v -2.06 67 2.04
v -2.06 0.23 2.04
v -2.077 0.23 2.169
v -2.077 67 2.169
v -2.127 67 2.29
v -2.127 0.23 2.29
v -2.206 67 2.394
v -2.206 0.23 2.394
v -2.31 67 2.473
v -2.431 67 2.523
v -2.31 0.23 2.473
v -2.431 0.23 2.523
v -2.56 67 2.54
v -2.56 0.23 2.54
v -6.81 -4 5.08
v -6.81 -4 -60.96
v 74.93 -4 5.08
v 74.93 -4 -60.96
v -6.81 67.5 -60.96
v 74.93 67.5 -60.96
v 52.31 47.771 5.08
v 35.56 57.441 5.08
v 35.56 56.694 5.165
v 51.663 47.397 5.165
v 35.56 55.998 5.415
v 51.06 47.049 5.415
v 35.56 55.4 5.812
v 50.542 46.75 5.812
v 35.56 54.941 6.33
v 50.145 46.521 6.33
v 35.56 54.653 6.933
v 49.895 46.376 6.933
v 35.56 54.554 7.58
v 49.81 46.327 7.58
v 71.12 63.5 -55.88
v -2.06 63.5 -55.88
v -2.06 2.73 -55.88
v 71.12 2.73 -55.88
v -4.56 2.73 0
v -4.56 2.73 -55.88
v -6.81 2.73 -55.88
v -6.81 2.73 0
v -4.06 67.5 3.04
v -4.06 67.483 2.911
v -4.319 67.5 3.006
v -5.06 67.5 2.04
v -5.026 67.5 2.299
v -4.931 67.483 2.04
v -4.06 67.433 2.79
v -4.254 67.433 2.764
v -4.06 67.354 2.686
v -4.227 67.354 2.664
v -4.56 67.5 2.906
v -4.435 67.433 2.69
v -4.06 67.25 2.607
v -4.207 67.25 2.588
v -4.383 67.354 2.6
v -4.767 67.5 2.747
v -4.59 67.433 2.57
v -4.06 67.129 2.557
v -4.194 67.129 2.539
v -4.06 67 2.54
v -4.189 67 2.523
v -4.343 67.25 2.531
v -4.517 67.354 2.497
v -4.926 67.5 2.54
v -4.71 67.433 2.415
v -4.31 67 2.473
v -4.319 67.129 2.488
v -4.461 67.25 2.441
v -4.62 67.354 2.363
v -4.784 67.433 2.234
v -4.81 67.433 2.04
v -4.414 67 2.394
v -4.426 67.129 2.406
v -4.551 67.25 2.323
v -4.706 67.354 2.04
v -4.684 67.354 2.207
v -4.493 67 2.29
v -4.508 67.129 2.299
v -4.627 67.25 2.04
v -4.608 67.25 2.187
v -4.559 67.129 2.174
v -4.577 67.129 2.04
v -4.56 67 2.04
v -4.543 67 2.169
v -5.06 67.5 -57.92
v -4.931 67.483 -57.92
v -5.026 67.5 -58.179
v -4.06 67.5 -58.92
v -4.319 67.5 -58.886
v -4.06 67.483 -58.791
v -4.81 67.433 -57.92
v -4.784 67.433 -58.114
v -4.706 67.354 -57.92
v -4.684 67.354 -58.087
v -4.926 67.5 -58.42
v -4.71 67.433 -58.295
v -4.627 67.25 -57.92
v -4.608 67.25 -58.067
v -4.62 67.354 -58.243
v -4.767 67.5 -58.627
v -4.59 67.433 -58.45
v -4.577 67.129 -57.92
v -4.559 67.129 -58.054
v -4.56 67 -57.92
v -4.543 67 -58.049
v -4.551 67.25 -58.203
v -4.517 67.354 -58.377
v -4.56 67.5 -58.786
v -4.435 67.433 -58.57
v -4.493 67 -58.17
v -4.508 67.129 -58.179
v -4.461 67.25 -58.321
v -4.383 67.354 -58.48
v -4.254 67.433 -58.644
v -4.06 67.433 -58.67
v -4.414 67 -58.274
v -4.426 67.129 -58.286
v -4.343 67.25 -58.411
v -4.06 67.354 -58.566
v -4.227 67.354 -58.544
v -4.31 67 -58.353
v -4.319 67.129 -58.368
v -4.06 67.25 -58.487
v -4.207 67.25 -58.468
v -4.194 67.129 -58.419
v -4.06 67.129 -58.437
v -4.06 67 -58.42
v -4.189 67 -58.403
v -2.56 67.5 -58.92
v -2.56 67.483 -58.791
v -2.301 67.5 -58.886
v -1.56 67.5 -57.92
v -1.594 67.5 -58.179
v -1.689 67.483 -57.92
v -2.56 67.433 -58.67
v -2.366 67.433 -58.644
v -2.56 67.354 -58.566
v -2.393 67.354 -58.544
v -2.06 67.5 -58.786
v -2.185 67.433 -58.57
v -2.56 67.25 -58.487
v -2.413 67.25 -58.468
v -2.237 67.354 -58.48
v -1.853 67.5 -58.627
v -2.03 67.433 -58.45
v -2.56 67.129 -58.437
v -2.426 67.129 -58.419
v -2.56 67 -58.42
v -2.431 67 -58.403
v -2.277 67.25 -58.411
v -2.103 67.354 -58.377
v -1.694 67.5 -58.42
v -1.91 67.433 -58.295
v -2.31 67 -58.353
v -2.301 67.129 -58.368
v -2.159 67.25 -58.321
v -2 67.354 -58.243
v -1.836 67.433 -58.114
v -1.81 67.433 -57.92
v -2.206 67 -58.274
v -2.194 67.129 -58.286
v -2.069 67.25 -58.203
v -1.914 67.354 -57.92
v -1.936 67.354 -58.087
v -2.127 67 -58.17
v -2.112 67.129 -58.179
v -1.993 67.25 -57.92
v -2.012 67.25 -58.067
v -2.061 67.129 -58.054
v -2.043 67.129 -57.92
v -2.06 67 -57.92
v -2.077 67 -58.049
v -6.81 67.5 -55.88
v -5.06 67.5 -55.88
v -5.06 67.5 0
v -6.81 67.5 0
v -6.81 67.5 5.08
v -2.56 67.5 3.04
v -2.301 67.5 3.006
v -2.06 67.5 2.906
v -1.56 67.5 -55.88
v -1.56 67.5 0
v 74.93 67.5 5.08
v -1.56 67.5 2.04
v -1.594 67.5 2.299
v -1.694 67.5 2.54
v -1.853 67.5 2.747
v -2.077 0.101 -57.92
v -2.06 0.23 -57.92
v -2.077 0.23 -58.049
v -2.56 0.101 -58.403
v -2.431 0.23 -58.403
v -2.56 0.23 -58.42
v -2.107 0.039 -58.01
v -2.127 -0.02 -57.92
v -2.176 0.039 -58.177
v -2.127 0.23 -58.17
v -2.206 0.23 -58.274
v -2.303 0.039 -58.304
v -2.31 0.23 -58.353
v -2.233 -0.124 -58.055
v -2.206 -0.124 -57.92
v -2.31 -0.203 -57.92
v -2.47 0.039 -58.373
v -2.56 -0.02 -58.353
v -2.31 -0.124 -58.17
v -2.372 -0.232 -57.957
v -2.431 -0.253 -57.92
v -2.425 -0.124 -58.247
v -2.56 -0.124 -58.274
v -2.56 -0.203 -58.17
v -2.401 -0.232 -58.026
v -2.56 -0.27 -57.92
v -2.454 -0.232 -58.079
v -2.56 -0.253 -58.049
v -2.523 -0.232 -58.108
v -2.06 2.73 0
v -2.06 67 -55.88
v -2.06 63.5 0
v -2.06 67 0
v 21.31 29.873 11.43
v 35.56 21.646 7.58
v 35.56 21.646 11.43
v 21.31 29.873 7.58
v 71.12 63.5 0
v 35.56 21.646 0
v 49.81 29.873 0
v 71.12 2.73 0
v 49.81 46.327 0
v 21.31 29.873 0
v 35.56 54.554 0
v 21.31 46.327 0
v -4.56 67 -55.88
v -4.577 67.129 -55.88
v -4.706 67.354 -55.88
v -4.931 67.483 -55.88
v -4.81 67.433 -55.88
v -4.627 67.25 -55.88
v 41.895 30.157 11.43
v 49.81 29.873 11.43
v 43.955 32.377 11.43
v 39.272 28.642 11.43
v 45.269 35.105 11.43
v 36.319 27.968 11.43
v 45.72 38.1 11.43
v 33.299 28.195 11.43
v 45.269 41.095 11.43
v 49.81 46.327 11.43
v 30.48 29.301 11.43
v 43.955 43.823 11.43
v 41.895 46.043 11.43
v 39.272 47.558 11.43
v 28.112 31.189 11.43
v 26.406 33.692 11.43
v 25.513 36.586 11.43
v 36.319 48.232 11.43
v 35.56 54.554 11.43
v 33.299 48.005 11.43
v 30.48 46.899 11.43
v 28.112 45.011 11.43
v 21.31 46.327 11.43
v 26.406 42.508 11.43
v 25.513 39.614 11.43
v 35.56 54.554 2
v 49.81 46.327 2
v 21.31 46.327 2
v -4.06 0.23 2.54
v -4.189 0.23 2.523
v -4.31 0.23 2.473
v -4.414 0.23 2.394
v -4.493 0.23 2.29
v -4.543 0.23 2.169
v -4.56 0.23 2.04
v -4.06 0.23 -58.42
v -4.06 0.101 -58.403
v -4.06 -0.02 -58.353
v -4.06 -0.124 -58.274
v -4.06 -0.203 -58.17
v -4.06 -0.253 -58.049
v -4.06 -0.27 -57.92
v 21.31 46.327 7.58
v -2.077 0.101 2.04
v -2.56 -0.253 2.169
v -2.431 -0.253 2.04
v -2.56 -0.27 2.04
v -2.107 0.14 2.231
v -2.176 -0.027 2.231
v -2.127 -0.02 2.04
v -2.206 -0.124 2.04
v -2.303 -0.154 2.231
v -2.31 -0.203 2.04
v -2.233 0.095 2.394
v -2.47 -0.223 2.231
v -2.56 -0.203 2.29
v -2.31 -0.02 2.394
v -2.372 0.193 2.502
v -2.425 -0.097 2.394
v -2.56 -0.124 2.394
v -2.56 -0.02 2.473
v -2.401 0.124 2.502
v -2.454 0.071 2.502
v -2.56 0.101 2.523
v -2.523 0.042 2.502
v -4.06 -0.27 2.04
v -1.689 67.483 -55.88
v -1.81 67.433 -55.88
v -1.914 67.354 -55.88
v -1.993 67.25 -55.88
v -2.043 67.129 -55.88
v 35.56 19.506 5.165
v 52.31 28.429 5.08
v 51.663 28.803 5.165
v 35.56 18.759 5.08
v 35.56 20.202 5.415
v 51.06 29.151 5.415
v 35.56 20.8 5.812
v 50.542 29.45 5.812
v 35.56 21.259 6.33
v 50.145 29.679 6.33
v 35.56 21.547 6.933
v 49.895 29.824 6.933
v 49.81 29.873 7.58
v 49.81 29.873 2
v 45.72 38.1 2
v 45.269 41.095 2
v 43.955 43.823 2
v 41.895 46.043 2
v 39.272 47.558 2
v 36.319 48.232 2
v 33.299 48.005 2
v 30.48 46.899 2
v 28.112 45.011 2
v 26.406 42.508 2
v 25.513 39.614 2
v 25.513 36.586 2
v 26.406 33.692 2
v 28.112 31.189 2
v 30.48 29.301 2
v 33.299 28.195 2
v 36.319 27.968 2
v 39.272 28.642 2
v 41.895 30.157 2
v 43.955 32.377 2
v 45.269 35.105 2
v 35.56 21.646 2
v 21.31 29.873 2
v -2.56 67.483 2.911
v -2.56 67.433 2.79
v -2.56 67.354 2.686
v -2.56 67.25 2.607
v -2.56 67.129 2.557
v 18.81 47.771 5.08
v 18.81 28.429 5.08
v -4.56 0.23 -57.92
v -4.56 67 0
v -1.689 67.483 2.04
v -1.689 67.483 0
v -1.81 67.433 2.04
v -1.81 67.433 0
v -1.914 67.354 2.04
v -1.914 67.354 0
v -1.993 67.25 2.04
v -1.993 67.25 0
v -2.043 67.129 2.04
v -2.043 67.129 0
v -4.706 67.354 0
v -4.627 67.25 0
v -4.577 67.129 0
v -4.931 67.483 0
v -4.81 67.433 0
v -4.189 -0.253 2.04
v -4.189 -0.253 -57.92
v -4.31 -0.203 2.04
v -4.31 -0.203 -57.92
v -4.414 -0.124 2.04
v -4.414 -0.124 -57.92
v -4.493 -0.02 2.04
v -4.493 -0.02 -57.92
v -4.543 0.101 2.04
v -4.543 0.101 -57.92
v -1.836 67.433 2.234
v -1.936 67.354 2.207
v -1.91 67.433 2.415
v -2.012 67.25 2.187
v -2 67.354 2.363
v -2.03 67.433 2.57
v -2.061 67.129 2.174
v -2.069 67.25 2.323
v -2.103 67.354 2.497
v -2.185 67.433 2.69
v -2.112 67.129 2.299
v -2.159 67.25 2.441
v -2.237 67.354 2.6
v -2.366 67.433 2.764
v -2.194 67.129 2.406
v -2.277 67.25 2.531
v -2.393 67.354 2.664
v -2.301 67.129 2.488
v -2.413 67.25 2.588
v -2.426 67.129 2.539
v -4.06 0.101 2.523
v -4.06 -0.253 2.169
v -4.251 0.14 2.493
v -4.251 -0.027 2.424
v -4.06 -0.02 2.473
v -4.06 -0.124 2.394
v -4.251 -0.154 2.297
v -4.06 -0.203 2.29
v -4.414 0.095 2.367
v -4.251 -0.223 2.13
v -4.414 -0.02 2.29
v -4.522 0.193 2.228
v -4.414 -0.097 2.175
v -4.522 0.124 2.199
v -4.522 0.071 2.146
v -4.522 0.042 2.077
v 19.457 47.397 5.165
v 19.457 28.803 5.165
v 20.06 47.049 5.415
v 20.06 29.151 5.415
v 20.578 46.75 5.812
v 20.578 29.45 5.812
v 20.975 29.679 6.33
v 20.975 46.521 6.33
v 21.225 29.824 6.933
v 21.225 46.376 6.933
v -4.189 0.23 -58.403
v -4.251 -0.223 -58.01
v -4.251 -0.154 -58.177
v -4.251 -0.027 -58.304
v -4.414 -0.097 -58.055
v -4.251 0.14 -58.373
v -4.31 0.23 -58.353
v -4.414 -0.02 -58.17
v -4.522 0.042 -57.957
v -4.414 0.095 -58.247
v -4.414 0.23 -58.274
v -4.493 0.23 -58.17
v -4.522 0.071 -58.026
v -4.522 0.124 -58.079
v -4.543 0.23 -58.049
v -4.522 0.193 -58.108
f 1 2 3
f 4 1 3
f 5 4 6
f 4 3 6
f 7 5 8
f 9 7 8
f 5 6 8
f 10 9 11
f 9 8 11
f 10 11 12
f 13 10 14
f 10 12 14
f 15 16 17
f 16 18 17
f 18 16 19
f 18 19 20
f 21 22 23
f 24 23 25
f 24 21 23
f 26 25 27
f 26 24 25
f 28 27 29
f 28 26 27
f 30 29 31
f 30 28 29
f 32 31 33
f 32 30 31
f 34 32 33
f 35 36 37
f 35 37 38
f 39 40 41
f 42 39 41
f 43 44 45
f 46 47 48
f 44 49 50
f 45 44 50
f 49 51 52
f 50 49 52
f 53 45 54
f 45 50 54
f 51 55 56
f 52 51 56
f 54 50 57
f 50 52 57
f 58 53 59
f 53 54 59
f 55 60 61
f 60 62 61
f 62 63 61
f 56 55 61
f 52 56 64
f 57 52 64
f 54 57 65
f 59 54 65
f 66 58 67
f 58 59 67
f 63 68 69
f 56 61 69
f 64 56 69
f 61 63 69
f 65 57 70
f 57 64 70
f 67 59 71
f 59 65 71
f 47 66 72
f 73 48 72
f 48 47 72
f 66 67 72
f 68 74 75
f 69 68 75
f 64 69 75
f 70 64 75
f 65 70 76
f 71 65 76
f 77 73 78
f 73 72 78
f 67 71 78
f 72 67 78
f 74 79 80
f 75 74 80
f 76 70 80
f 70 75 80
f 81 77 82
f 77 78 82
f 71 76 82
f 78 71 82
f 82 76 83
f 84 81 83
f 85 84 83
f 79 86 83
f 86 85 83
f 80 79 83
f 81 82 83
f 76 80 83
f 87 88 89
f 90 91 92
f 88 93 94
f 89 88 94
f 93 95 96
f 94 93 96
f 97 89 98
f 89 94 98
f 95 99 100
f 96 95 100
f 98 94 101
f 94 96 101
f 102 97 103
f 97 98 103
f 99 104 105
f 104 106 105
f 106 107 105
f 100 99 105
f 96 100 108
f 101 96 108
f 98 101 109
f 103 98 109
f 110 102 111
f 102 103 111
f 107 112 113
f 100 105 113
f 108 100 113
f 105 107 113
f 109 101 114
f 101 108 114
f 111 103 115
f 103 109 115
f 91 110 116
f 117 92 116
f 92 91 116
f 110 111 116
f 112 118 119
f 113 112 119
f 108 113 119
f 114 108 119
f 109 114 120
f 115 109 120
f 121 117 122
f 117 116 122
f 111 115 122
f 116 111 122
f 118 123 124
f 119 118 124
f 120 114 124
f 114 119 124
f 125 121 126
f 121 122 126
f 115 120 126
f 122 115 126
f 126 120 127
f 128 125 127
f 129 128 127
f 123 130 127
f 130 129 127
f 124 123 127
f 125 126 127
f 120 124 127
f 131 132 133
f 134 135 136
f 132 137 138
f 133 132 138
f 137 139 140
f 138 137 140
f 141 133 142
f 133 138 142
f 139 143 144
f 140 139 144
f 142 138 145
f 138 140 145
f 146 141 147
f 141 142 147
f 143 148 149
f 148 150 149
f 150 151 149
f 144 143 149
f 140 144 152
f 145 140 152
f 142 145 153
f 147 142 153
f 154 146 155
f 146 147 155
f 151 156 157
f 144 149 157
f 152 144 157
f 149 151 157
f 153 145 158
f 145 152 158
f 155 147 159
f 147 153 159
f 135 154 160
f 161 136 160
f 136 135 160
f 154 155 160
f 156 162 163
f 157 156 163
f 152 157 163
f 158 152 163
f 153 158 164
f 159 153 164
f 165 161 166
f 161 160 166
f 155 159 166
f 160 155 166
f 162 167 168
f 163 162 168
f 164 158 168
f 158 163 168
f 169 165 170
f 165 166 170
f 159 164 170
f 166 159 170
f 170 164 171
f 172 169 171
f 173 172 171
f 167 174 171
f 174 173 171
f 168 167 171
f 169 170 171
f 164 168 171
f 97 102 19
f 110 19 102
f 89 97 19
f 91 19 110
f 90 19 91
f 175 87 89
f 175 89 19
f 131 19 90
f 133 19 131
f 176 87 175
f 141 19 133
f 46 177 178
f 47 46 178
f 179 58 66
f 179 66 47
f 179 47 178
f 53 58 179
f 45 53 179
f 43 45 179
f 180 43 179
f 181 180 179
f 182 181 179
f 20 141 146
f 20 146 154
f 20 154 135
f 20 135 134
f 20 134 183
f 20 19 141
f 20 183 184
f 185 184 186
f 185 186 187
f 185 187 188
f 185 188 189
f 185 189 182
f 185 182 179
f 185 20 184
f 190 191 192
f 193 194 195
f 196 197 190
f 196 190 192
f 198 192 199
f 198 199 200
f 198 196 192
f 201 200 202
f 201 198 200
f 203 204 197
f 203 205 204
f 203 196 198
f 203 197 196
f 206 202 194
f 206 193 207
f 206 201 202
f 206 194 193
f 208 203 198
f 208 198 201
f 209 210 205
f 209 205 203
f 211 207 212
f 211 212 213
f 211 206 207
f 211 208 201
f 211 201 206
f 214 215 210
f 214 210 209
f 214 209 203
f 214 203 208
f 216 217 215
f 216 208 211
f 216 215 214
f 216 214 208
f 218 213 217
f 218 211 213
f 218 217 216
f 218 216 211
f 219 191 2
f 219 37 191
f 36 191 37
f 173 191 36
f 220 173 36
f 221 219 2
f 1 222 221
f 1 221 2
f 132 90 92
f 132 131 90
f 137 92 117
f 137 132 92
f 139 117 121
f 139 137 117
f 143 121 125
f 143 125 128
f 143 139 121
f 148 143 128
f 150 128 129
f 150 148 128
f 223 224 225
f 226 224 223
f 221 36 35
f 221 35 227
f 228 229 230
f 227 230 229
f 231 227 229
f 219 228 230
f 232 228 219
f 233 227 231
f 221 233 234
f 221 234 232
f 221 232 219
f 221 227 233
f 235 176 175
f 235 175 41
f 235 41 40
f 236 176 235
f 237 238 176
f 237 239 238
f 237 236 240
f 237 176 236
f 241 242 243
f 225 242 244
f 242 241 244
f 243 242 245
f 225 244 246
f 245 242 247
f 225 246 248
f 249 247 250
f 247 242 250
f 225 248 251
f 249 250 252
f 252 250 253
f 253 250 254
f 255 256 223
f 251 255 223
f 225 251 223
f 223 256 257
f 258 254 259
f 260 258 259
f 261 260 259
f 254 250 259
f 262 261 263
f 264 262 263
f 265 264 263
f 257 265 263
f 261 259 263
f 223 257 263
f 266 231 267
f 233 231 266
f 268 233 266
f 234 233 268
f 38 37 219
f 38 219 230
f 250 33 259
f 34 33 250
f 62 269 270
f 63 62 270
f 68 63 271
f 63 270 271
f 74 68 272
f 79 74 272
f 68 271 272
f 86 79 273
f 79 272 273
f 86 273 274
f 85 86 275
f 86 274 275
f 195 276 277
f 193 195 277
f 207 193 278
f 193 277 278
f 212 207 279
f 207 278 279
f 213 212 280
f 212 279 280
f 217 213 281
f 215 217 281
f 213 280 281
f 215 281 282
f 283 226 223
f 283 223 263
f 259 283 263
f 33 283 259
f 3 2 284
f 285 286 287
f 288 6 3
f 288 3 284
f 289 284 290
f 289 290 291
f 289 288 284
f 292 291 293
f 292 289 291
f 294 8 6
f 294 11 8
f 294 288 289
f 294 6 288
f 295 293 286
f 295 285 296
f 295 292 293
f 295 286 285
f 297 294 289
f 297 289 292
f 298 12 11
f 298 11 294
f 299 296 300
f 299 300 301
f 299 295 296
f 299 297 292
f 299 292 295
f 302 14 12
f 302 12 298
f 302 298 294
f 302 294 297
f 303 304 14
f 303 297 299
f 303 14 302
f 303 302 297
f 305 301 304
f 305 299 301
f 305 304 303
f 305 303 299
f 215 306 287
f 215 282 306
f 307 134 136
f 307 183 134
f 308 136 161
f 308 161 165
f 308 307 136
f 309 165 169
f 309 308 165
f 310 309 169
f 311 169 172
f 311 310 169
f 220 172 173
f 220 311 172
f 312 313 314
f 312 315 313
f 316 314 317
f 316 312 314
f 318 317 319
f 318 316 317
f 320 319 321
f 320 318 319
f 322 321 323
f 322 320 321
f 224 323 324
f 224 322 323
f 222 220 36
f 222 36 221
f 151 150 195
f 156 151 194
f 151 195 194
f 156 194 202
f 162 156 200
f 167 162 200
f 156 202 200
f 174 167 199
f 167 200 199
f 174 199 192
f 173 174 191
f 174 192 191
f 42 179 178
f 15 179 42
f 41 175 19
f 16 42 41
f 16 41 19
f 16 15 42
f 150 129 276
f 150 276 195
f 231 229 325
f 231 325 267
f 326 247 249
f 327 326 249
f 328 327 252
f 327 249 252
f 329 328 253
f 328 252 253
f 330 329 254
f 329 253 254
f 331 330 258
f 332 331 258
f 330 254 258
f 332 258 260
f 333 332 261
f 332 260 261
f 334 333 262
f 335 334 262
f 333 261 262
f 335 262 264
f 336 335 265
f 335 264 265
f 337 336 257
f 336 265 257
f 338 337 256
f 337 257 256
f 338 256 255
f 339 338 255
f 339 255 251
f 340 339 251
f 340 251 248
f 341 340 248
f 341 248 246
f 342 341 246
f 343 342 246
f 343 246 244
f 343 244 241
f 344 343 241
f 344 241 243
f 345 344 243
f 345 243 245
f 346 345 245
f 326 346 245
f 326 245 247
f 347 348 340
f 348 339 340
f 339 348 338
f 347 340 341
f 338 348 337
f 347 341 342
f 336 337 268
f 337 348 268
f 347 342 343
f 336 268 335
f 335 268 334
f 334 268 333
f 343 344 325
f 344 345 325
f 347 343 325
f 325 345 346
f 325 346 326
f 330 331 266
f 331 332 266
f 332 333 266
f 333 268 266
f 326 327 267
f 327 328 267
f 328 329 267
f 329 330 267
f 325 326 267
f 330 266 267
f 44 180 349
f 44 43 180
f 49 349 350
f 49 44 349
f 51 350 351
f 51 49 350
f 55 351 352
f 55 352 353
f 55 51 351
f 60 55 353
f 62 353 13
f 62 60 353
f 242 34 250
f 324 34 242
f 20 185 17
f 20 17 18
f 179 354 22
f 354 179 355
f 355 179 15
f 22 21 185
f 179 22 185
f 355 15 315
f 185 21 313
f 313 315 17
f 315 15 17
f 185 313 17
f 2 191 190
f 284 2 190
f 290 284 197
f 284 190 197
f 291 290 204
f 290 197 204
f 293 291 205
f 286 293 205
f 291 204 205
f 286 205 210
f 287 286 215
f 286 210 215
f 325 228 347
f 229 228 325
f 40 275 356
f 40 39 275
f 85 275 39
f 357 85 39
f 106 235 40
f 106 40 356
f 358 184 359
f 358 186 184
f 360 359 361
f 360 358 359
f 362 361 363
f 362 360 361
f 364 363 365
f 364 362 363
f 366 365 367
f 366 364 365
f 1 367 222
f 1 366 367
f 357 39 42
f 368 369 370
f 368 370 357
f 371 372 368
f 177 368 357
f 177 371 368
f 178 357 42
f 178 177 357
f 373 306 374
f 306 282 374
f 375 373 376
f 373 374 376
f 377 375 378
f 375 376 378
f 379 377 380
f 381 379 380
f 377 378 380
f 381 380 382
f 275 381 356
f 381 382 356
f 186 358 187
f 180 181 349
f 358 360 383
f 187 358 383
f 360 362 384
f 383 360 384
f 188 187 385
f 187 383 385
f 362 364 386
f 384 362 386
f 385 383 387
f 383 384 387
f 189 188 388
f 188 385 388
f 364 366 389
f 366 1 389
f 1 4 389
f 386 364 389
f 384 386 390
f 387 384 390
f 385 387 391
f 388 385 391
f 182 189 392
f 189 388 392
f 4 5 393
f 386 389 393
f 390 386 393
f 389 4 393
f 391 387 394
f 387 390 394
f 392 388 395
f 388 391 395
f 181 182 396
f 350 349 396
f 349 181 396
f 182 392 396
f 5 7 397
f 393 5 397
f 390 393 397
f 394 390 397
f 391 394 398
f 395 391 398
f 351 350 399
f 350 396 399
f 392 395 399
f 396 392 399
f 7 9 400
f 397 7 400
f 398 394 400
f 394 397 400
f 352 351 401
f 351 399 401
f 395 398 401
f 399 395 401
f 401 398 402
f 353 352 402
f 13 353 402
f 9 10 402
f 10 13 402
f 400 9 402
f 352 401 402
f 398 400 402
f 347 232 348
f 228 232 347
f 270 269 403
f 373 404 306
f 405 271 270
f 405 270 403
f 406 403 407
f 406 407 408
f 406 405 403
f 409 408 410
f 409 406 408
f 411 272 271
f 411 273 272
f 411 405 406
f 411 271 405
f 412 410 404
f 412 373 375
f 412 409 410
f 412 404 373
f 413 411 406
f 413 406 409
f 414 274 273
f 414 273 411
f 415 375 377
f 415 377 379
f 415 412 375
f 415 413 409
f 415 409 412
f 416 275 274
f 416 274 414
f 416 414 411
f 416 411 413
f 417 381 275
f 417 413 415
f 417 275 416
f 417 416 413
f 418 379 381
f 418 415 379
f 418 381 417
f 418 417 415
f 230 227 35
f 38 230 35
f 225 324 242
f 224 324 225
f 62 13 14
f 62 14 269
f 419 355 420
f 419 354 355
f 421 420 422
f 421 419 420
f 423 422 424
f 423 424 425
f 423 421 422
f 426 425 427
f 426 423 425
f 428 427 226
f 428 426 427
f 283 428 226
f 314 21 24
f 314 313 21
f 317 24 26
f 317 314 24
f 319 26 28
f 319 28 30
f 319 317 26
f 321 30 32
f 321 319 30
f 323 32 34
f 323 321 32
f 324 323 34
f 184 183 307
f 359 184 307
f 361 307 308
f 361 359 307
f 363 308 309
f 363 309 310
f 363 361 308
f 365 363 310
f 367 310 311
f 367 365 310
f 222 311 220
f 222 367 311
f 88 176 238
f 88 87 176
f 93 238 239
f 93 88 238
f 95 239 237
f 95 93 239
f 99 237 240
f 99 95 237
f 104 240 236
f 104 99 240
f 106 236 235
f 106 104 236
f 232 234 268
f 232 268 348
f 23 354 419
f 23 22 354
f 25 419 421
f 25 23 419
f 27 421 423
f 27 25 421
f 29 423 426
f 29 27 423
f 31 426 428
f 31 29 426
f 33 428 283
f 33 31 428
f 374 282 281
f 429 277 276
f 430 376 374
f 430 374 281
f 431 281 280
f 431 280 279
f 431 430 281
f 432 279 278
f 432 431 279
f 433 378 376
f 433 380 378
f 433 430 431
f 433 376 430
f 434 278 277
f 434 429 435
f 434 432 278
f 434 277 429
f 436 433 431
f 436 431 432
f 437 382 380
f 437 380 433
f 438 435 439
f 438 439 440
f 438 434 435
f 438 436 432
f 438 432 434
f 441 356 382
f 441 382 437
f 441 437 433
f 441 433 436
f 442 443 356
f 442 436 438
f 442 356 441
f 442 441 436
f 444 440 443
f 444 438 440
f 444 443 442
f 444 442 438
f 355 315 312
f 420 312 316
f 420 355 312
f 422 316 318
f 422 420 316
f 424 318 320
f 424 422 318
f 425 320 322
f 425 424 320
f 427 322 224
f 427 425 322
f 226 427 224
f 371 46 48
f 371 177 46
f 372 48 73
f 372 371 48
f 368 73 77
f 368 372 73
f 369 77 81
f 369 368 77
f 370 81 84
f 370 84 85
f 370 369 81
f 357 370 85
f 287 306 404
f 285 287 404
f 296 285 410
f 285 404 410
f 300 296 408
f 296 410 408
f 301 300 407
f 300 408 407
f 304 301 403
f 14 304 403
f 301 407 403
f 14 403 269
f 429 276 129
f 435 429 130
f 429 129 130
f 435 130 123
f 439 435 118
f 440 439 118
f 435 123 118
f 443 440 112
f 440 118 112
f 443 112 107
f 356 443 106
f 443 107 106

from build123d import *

# Parameters (mm, degrees)
SKETCH1_W            = 78.74
SKETCH1_H            = 66.04
SKETCH1_W_2          = 71.12
SKETCH1_H_2          = 55.88
BOSS_EXTRUDE1_DEPTH  = 63.5
SKETCH2_W            = 78.74
SKETCH2_H            = 66.04
BOSS_EXTRUDE2_DEPTH  = 4
CUT_EXTRUDE1_REACH   = 120.103
SKETCH3_W            = 13.462
SKETCH3_H            = 13.97
CUT_EXTRUDE2_REACH   = 120.103
SKETCH4_W            = 10.922
SKETCH4_H            = 13.97
SKETCH16_W           = 66.04
SKETCH16_H           = 67.5
SKETCH16_W_2         = 13.462
SKETCH16_H_2         = 13.97
SKETCH16_W_3         = 10.922
BOSS_EXTRUDE8_DEPTH  = 3
SKETCH17_W           = 81.74
SKETCH17_H           = 66.04
BOSS_EXTRUDE9_DEPTH  = 4
CUT_EXTRUDE10_DEPTH  = 64.77
SKETCH19_W           = 2.5
SKETCH19_H           = 60.96
CUT_EXTRUDE11_DEPTH  = 3
SKETCH20_W           = 55.88
SKETCH20_H           = 4
BOSS_EXTRUDE10_DEPTH = 2.25
SKETCH21_W           = 71.12
SKETCH21_H           = 55.88
BOSS_EXTRUDE11_DEPTH = 2.73
FILLET2_R            = 0.5
BOSS_EXTRUDE12_DEPTH = 6.35
SKETCH22_R           = 10.16
CUT_EXTRUDE12_DEPTH  = 11.35
CUT_EXTRUDE13_DEPTH  = 2
FILLET3_R            = 2.5


with BuildPart() as part:
    # Sketch1 → Boss-Extrude1 (new body)
    with BuildSketch(Plane(origin=(0, 0, 0), x_dir=(1, 0, 0), z_dir=(0, 1, 0))):
        with Locations((35.56, 27.94)):
            Rectangle(SKETCH1_W, SKETCH1_H)
        with Locations((35.56, 27.94)):
            Rectangle(SKETCH1_W_2, SKETCH1_H_2, mode=Mode.SUBTRACT)
    extrude(amount=BOSS_EXTRUDE1_DEPTH)

    # Sketch2 → Boss-Extrude2 (add)
    with BuildSketch(Plane(origin=(0, 0, 0), x_dir=(1, 0, 0), z_dir=(0, 1, 0))):
        with Locations((35.56, 27.94)):
            Rectangle(SKETCH2_W, SKETCH2_H)
    extrude(amount=-BOSS_EXTRUDE2_DEPTH)

    # Sketch3 → Cut-Extrude1 (cut, up to next)
    with BuildSketch(Plane.ZY.offset(3.81), mode=Mode.PRIVATE) as cut_extrude1_sk1:
        with Locations((-40.729, 11.875)):
            Rectangle(SKETCH3_W, SKETCH3_H)
    cut_extrude1_tool1 = extrude(cut_extrude1_sk1.sketch, amount=-CUT_EXTRUDE1_REACH, mode=Mode.PRIVATE) & part.part
    add(cut_extrude1_tool1.solids().sort_by_distance((-3.81, 11.875, -40.729))[0], mode=Mode.SUBTRACT)

    # Sketch4 → Cut-Extrude2 (cut, up to next)
    with BuildSketch(Plane.ZY.offset(3.81), mode=Mode.PRIVATE) as cut_extrude2_sk1:
        with Locations((-8.001, 11.875)):
            Rectangle(SKETCH4_W, SKETCH4_H)
    cut_extrude2_tool1 = extrude(cut_extrude2_sk1.sketch, amount=-CUT_EXTRUDE2_REACH, mode=Mode.PRIVATE) & part.part
    add(cut_extrude2_tool1.solids().sort_by_distance((-3.81, 11.875, -8.001))[0], mode=Mode.SUBTRACT)

    # Sketch16 → Boss-Extrude8 (add)
    with BuildSketch(Plane.ZY.offset(3.81)):
        with Locations((-27.94, 29.75)):
            Rectangle(SKETCH16_W, SKETCH16_H)
        with Locations((-40.729, 11.875)):
            Rectangle(SKETCH16_W_2, SKETCH16_H_2, mode=Mode.SUBTRACT)
        with Locations((-8.001, 11.875)):
            Rectangle(SKETCH16_W_3, SKETCH16_H_2, mode=Mode.SUBTRACT)
    extrude(amount=BOSS_EXTRUDE8_DEPTH)

    # Sketch17 → Boss-Extrude9 (add)
    with BuildSketch(Plane(origin=(0, 63.5, 0), x_dir=(1, 0, 0), z_dir=(0, 1, 0))):
        with Locations((34.06, 27.94)):
            Rectangle(SKETCH17_W, SKETCH17_H)
    extrude(amount=BOSS_EXTRUDE9_DEPTH)

    # Sketch18 → Cut-Extrude10 (cut)
    with BuildSketch(Plane(origin=(0, 67.5, 0), x_dir=(1, 0, 0), z_dir=(0, 1, 0))):
        Polygon((-4.560006, 58.42), (-2.060006, 58.42), (-2.060006, 55.88), (0.189988, 55.88), (0.189988, 0), (-2.060006, 0), (-2.060006, -2.54), (-4.560006, -2.54), (-4.560006, 0), (-6.81, 0), (-6.81, 55.88), (-4.560006, 55.88), align=None)
    extrude(amount=-CUT_EXTRUDE10_DEPTH, mode=Mode.SUBTRACT)

    # Sketch19 → Cut-Extrude11 (cut)
    with BuildSketch(Plane(origin=(0, 2.73, 0), x_dir=(1, 0, 0), z_dir=(0, 1, 0))):
        with Locations((-3.310006, 27.94)):
            Rectangle(SKETCH19_W, SKETCH19_H)
    extrude(amount=-CUT_EXTRUDE11_DEPTH, mode=Mode.SUBTRACT)

    # Sketch20 → Boss-Extrude10 (add)
    with BuildSketch(Plane.ZY.offset(-0.189988)):
        with Locations((-27.94, 65.5)):
            Rectangle(SKETCH20_W, SKETCH20_H)
    extrude(amount=BOSS_EXTRUDE10_DEPTH)

    # Sketch21 → Boss-Extrude11 (add)
    with BuildSketch(Plane(origin=(0, 0, 0), x_dir=(1, 0, 0), z_dir=(0, 1, 0))):
        with Locations((35.56, 27.94)):
            Rectangle(SKETCH21_W, SKETCH21_H)
    extrude(amount=BOSS_EXTRUDE11_DEPTH)

    # Fillet2
    fillet2_edges = [part.edges().sort_by_distance(p)[0] for p in [
        (-2.060006, 33.615, -58.42),
    ]]
    fillet(fillet2_edges, radius=FILLET2_R)
    fillet2_2_edges = [part.edges().sort_by_distance(p)[0] for p in [
        (-2.060006, -0.27, -27.69),
    ]]
    fillet(fillet2_2_edges, radius=FILLET2_R)
    fillet2_3_edges = [part.edges().sort_by_distance(p)[0] for p in [
        (-2.060006, 33.865, 2.54),
    ]]
    fillet(fillet2_3_edges, radius=FILLET2_R)
    fillet2_4_edges = [part.edges().sort_by_distance(p)[0] for p in [
        (-4.560006, 33.865, 2.54),
    ]]
    fillet(fillet2_4_edges, radius=FILLET2_R)
    fillet2_5_edges = [part.edges().sort_by_distance(p)[0] for p in [
        (-3.310006, 67.5, 2.54),
    ]]
    fillet(fillet2_5_edges, radius=FILLET2_R)
    fillet2_6_edges = [part.edges().sort_by_distance(p)[0] for p in [
        (-4.560006, 67.5, -56.9),
    ]]
    fillet(fillet2_6_edges, radius=FILLET2_R)
    fillet2_7_edges = [part.edges().sort_by_distance(p)[0] for p in [
        (-2.060012, 67.5, -27.94),
    ]]
    fillet(fillet2_7_edges, radius=FILLET2_R - 0.0001)  # a hair under: the kernel refuses the full size

    # Sketch11 → Boss-Extrude12 (add)
    with BuildSketch(Plane.XY.offset(5.08)):
        Polygon((49.81, 46.327241336), (49.81, 29.872758664), (35.56, 21.645517328), (21.31, 29.872758664), (21.31, 46.327241336), (35.56, 54.554482672), align=None)
    extrude(amount=BOSS_EXTRUDE12_DEPTH)

    # Sketch22 → Cut-Extrude12 (cut)
    with BuildSketch(Plane.XY.offset(11.43)):
        with Locations((35.56, 38.1)):
            Circle(SKETCH22_R)
    extrude(amount=-CUT_EXTRUDE12_DEPTH, mode=Mode.SUBTRACT)

    # Sketch23 → Cut-Extrude13 (cut)
    with BuildSketch(Plane(origin=(0, 0, 0), x_dir=(-1, 0, 0), z_dir=(0, 0, -1))):
        Polygon((-21.31, 46.327241336), (-21.31, 29.872758664), (-35.56, 21.645517328), (-49.81, 29.872758664), (-49.81, 46.327241336), (-35.56, 54.554482672), align=None)
    extrude(amount=-CUT_EXTRUDE13_DEPTH, mode=Mode.SUBTRACT)

    # Fillet3
    fillet3_edges = [part.edges().sort_by_distance(p)[0] for p in [
        (42.685, 50.440862004, 5.08),
        (28.435, 50.440862004, 5.08),
        (21.31, 38.1, 5.08),
        (28.435, 25.759137996, 5.08),
        (42.685, 25.759137996, 5.08),
        (49.81, 38.1, 5.08),
    ]]
    fillet(fillet3_edges, radius=FILLET3_R)


solid = part.part
